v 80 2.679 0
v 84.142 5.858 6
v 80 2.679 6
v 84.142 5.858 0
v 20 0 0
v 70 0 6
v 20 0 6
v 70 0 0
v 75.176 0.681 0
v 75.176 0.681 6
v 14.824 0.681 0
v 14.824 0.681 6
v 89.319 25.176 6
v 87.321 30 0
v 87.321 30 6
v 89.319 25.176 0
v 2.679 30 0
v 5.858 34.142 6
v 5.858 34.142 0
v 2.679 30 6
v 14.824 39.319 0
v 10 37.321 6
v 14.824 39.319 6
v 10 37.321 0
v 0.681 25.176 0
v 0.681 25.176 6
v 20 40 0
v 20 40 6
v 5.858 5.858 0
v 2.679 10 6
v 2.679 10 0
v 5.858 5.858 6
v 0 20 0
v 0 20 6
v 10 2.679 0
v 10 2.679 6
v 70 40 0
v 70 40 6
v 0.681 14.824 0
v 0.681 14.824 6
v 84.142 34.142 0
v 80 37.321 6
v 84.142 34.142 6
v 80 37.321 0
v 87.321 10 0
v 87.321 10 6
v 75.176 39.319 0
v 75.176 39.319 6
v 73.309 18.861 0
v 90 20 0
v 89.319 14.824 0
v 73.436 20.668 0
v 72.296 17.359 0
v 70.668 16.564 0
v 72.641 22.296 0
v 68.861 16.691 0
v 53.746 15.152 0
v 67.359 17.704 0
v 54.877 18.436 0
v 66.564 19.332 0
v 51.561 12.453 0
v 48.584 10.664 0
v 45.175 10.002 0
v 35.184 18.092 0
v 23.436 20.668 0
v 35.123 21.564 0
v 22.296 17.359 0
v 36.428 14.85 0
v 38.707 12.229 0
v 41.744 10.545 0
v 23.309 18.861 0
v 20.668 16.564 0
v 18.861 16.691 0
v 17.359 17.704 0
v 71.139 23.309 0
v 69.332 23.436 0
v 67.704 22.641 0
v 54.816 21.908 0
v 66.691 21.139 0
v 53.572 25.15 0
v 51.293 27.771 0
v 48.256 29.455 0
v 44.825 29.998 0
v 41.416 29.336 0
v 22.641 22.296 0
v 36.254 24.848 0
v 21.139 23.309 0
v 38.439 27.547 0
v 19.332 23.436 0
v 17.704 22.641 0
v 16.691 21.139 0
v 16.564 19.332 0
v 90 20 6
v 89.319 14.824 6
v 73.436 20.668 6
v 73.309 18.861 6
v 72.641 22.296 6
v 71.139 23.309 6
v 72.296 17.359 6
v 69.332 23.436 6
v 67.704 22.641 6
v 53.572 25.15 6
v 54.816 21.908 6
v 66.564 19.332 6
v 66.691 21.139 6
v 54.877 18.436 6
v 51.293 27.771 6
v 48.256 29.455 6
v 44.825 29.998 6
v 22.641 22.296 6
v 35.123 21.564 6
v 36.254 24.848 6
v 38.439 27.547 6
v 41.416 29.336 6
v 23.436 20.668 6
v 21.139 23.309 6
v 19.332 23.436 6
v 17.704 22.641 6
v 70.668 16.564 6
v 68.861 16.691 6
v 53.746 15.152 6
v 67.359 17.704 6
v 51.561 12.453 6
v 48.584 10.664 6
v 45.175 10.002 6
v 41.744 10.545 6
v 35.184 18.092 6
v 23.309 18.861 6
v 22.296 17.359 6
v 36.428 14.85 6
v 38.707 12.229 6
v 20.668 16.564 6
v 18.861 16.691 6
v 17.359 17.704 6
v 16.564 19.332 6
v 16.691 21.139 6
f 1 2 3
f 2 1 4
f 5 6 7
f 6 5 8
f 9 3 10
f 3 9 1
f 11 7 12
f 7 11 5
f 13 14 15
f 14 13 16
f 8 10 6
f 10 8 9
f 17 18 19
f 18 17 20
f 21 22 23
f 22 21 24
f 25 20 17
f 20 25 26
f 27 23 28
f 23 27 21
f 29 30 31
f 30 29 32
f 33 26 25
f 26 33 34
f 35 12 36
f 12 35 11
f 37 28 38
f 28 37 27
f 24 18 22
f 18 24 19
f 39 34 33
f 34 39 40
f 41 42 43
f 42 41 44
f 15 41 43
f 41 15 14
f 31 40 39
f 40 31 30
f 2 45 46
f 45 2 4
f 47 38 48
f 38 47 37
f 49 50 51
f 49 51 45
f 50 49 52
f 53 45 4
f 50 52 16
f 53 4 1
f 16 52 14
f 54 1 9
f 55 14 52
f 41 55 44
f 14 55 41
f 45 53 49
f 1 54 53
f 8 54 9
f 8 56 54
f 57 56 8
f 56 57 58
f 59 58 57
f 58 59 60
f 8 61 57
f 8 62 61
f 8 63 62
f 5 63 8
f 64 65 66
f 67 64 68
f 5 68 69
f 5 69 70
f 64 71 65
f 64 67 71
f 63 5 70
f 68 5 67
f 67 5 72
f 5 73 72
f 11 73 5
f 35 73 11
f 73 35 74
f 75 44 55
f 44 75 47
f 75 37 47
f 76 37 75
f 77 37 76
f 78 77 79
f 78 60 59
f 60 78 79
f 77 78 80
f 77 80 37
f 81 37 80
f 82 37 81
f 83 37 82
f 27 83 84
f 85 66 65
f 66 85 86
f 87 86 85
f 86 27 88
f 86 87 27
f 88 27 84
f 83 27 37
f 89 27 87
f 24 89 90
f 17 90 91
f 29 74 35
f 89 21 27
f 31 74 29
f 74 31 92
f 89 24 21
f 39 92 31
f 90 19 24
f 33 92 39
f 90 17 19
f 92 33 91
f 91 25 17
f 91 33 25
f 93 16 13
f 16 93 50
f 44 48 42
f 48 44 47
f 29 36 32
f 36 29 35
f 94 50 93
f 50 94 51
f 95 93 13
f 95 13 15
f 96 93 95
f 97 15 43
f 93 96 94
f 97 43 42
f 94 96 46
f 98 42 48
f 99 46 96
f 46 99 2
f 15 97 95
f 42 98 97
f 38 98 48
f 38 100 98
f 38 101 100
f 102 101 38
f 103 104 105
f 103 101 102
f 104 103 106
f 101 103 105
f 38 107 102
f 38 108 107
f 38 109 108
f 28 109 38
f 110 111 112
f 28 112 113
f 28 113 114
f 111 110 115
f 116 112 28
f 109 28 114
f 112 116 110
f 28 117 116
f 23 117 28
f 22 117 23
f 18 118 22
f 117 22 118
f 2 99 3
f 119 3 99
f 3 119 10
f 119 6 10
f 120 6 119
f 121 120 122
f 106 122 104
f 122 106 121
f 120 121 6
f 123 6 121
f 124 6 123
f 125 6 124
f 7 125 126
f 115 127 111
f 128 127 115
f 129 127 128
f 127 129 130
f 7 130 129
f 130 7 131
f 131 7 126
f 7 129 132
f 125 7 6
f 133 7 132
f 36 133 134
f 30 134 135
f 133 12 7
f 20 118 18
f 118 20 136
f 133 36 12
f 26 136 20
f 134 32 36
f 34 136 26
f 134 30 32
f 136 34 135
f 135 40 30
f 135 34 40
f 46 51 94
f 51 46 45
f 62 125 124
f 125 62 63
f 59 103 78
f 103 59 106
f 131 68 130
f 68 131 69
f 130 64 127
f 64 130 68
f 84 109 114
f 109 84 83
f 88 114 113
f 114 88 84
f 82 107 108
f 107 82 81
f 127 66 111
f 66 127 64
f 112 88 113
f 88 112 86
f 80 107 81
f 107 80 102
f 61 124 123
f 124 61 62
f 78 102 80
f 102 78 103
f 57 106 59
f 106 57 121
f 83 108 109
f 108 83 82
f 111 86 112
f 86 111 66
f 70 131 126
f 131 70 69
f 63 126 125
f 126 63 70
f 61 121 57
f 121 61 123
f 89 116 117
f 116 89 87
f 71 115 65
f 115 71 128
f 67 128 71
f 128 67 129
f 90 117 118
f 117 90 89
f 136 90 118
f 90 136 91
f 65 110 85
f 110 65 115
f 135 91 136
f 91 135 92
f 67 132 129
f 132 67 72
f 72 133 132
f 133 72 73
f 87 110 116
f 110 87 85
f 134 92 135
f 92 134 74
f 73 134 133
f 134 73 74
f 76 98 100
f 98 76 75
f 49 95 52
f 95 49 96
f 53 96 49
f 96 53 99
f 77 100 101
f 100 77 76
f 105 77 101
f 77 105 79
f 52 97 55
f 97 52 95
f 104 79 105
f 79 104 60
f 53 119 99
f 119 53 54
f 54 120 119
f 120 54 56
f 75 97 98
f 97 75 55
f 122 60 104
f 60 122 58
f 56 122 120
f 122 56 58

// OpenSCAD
$fn = 32;

// ----------------------------------------------------------------------
// Spacer plate: obround span 50, caps R20
// ----------------------------------------------------------------------

// --- parameters (mm) ---
bore_r = 10;              // centre bore radius
bolt_r = 3.5;             // bolt hole radius
plate_t = 6;              // plate thickness, Z (extrusion height)
span = 50;                // obround span
cap_r = 20;               // cap radius

profile = [[20, 40], [14.824, 39.319], [10, 37.321], [5.858, 34.142], [2.679, 30], [0.681, 25.176], [0, 20], [0.681, 14.824], [2.679, 10], [5.858, 5.858], [10, 2.679], [14.824, 0.681], [20, 0], [70, 0], [75.176, 0.681], [80, 2.679], [84.142, 5.858], [87.321, 10], [89.319, 14.824], [90, 20], [89.319, 25.176], [87.321, 30], [84.142, 34.142], [80, 37.321], [75.176, 39.319], [70, 40]];  // primary outline, 26 points, counter clockwise
void_1 = [[54.816, 21.908], [53.572, 25.15], [51.293, 27.771], [48.256, 29.455], [44.825, 29.998], [41.416, 29.336], [38.439, 27.547], [36.254, 24.848], [35.123, 21.564], [35.184, 18.092], [36.428, 14.85], [38.707, 12.229], [41.744, 10.545], [45.175, 10.002], [48.584, 10.664], [51.561, 12.453], [53.746, 15.152], [54.877, 18.436]];  // centre bore, 18 points
void_2 = [[23.436, 20.668], [22.641, 22.296], [21.139, 23.309], [19.332, 23.436], [17.704, 22.641], [16.691, 21.139], [16.564, 19.332], [17.359, 17.704], [18.861, 16.691], [20.668, 16.564], [22.296, 17.359], [23.309, 18.861]];  // end hole, 12 points
void_3 = [[73.436, 20.668], [72.641, 22.296], [71.139, 23.309], [69.332, 23.436], [67.704, 22.641], [66.691, 21.139], [66.564, 19.332], [67.359, 17.704], [68.861, 16.691], [70.668, 16.564], [72.296, 17.359], [73.309, 18.861]];  // end hole, 12 points

// --- the one profile operation ---
difference() {
  linear_extrude(height = plate_t) polygon(points = profile);
  translate([0, 0, -1])
    linear_extrude(height = plate_t + 2) polygon(points = void_1);
  translate([0, 0, -1])
    linear_extrude(height = plate_t + 2) polygon(points = void_2);
  translate([0, 0, -1])
    linear_extrude(height = plate_t + 2) polygon(points = void_3);
}
